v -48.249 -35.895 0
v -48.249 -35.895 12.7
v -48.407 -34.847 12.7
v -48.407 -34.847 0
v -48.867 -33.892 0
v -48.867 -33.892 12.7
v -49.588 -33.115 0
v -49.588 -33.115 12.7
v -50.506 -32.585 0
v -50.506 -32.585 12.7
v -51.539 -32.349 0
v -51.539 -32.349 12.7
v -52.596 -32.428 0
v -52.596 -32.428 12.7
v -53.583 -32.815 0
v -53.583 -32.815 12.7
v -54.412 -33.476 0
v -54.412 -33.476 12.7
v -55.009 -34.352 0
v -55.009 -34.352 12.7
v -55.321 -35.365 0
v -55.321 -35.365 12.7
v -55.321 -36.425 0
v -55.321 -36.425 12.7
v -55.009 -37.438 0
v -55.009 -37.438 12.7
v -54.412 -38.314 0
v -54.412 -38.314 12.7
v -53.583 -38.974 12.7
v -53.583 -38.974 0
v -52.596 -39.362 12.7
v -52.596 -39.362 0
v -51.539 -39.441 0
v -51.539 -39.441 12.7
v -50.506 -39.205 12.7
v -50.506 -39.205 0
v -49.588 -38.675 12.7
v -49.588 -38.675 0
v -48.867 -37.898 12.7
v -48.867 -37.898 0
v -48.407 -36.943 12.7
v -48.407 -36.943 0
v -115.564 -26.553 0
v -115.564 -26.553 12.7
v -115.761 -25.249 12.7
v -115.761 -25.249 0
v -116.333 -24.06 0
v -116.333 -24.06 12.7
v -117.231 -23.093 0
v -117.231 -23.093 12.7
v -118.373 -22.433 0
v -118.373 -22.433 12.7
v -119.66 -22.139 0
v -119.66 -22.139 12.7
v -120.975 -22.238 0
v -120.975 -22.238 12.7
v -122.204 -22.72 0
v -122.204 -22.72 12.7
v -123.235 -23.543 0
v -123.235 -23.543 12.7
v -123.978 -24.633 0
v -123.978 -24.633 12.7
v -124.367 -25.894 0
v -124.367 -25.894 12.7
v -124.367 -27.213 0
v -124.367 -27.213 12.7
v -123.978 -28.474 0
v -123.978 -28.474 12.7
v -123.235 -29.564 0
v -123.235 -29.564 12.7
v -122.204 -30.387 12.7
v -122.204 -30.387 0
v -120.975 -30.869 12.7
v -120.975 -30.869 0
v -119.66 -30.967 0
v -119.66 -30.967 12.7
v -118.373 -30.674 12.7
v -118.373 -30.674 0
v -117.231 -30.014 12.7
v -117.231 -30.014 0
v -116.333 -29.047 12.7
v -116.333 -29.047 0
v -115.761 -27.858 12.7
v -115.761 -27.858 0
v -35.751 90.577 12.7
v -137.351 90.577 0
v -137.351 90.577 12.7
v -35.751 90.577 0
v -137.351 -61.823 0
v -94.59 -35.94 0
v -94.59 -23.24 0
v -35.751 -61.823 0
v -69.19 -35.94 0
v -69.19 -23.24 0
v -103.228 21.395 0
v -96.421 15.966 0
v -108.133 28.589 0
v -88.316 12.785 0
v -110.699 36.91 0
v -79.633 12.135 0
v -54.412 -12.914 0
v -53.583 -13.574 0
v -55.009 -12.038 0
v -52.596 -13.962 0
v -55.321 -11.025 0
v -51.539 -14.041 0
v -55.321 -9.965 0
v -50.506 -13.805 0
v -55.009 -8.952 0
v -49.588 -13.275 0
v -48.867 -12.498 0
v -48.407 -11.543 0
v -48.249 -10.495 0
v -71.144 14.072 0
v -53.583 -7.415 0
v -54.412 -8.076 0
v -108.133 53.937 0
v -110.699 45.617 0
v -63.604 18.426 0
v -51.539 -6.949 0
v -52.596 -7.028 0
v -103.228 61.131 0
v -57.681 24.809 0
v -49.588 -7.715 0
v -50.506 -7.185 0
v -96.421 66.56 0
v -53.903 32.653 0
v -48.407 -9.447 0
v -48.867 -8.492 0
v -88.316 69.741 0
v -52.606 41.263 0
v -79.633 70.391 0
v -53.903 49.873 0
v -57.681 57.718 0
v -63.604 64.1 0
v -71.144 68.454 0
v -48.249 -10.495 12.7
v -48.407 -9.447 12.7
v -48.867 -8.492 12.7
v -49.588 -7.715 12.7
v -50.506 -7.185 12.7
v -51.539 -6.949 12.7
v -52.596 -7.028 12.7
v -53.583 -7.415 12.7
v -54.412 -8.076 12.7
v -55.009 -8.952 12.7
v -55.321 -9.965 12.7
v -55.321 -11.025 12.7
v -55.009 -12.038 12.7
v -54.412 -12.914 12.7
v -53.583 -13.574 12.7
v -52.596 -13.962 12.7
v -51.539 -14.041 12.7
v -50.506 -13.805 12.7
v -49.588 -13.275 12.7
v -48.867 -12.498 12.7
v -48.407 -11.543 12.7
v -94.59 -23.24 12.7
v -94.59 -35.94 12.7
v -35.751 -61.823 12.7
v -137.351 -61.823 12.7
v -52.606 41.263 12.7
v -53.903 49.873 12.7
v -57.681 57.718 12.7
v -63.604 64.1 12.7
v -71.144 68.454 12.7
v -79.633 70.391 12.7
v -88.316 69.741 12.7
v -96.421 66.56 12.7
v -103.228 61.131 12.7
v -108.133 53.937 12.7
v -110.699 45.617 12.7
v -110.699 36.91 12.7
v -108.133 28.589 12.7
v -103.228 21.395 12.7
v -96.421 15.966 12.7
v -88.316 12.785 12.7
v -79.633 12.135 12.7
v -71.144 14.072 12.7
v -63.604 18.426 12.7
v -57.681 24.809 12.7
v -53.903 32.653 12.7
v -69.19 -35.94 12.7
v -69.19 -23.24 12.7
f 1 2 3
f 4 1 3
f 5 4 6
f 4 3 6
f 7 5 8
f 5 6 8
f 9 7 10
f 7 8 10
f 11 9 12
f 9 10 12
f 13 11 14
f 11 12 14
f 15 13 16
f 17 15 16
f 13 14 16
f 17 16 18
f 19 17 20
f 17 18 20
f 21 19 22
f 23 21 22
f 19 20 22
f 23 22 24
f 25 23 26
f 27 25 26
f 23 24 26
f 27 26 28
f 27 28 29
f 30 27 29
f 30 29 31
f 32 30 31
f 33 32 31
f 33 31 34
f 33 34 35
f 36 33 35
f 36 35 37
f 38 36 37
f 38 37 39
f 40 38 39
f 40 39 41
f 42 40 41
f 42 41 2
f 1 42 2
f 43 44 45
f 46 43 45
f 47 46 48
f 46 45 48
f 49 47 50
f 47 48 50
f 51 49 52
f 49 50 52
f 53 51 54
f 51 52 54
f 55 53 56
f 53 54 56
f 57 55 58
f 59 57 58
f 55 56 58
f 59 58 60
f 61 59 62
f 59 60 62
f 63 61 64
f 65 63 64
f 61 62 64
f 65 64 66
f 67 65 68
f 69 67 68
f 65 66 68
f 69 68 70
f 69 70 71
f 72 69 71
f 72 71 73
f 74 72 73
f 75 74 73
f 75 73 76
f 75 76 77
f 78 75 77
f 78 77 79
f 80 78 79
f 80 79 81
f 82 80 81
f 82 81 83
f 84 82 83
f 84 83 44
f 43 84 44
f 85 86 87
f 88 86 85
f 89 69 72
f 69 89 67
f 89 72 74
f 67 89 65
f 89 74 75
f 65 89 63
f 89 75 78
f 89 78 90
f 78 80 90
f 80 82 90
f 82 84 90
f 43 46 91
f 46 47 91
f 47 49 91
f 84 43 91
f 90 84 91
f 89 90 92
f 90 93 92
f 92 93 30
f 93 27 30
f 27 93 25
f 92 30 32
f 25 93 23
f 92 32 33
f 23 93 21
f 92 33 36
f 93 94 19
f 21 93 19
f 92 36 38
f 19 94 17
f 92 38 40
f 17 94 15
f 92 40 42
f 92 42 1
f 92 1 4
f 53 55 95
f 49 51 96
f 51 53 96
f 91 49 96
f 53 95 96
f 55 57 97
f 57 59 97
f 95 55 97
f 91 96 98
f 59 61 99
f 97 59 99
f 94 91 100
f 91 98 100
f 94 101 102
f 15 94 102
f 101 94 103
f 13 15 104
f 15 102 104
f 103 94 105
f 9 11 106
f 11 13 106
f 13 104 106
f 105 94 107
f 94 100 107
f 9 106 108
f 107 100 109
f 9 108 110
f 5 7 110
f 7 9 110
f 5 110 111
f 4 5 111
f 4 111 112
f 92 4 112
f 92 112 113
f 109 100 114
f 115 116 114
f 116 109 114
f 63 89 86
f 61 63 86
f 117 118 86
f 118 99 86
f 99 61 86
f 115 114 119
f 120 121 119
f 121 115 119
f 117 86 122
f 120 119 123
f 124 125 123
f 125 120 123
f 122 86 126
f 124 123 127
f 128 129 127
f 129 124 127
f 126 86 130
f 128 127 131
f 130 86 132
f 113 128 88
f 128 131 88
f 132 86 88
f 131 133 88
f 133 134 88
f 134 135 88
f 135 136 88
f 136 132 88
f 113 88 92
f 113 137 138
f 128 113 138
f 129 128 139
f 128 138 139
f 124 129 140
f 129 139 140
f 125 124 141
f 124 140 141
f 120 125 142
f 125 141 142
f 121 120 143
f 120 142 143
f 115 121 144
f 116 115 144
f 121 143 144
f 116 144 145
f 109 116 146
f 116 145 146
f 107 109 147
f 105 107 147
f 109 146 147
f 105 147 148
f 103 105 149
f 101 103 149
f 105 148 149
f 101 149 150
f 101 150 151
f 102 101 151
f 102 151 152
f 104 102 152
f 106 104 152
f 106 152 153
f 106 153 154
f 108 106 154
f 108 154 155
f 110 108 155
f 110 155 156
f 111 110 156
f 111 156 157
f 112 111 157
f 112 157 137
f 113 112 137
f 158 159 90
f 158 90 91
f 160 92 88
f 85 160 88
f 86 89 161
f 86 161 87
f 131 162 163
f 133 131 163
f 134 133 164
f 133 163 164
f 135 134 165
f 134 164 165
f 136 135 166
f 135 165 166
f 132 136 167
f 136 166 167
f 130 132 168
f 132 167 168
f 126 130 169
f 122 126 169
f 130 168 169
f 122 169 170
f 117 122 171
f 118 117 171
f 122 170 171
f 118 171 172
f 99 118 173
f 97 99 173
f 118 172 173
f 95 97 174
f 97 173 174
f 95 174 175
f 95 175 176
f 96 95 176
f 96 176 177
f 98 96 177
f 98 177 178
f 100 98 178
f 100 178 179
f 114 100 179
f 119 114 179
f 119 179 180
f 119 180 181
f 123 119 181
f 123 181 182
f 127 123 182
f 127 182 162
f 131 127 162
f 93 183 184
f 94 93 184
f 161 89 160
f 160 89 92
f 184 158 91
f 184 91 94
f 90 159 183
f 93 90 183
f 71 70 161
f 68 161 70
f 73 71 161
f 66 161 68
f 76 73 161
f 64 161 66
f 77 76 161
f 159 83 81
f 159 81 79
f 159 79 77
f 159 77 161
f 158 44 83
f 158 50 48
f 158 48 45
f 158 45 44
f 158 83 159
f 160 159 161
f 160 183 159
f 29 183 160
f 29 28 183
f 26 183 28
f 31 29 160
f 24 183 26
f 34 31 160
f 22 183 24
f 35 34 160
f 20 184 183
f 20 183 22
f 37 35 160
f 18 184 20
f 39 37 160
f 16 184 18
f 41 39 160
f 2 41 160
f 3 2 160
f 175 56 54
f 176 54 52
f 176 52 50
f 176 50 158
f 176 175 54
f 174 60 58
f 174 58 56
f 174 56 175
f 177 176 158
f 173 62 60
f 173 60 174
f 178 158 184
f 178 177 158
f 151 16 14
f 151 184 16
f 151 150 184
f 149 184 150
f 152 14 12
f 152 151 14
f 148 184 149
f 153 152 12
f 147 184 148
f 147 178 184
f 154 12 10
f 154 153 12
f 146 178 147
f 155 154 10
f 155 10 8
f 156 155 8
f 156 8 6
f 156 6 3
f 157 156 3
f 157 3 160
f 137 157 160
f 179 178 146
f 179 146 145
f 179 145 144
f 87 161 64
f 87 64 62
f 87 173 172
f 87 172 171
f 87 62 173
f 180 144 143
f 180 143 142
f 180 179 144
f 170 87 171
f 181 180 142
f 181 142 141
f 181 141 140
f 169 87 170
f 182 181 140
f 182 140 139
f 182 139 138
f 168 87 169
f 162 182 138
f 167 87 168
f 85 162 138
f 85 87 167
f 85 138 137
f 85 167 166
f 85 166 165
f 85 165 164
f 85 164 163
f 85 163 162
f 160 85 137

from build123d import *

# Parameters (mm, degrees)
F0_W        = 101.6
F0_H        = 152.4
F4_DEPTH    = 12.7
F1_R        = 29.21
F2_R        = 4.426371
F2_W        = 25.4
F2_H        = 12.7
F3_R        = 3.556
F5_DEPTH    = 25.4
F5_FACE_W   = 25.4
F5_FACE_H   = 12.7
F5_FACE_R   = 29.21
F5_FACE_R_2 = 3.556
F5_FACE_R_3 = 4.426371
F6_DEPTH    = 25.4


with BuildPart() as f4:
    # F0 (on Top) → F4 (new body)
    with BuildSketch(Plane.XY):
        with Locations((-86.551244, 14.376812)):
            Rectangle(F0_W, F0_H)
    extrude(amount=F4_DEPTH)

    # F1 (on Top) + F2 (on Top) + F3 (on Top) → F5 (join)
    with BuildSketch(Plane.XY):
        with Locations((-81.815682, 41.263096)):
            Circle(F1_R)
    with BuildSketch(Plane.XY):
        with Locations((-119.990457, -26.553331)):
            Circle(F2_R)
        with Locations((-81.890457, -29.590288)):
            Rectangle(F2_W, F2_H)
    with BuildSketch(Plane.XY):
        with Locations((-51.804963, -10.494831)):
            Circle(F3_R)
        with Locations((-51.804963, -35.894831)):
            Circle(F3_R)
    extrude(amount=F5_DEPTH)

    # F5_face (on face) → F6 (cut)
    with BuildSketch(Plane(origin=(-81.890457, -29.590288, 25.4), x_dir=(1, 0, 0), z_dir=(0, 0, 1))):
        Rectangle(F5_FACE_W, F5_FACE_H)
        with Locations((0.074775, 70.853384)):
            Circle(F5_FACE_R)
        with Locations((30.085494, 19.095457)):
            Circle(F5_FACE_R_2)
        with Locations((30.085494, -6.304543)):
            Circle(F5_FACE_R_2)
        with Locations((-38.1, 3.036957)):
            Circle(F5_FACE_R_3)
    extrude(amount=-F6_DEPTH, mode=Mode.SUBTRACT)


solid = f4.part
